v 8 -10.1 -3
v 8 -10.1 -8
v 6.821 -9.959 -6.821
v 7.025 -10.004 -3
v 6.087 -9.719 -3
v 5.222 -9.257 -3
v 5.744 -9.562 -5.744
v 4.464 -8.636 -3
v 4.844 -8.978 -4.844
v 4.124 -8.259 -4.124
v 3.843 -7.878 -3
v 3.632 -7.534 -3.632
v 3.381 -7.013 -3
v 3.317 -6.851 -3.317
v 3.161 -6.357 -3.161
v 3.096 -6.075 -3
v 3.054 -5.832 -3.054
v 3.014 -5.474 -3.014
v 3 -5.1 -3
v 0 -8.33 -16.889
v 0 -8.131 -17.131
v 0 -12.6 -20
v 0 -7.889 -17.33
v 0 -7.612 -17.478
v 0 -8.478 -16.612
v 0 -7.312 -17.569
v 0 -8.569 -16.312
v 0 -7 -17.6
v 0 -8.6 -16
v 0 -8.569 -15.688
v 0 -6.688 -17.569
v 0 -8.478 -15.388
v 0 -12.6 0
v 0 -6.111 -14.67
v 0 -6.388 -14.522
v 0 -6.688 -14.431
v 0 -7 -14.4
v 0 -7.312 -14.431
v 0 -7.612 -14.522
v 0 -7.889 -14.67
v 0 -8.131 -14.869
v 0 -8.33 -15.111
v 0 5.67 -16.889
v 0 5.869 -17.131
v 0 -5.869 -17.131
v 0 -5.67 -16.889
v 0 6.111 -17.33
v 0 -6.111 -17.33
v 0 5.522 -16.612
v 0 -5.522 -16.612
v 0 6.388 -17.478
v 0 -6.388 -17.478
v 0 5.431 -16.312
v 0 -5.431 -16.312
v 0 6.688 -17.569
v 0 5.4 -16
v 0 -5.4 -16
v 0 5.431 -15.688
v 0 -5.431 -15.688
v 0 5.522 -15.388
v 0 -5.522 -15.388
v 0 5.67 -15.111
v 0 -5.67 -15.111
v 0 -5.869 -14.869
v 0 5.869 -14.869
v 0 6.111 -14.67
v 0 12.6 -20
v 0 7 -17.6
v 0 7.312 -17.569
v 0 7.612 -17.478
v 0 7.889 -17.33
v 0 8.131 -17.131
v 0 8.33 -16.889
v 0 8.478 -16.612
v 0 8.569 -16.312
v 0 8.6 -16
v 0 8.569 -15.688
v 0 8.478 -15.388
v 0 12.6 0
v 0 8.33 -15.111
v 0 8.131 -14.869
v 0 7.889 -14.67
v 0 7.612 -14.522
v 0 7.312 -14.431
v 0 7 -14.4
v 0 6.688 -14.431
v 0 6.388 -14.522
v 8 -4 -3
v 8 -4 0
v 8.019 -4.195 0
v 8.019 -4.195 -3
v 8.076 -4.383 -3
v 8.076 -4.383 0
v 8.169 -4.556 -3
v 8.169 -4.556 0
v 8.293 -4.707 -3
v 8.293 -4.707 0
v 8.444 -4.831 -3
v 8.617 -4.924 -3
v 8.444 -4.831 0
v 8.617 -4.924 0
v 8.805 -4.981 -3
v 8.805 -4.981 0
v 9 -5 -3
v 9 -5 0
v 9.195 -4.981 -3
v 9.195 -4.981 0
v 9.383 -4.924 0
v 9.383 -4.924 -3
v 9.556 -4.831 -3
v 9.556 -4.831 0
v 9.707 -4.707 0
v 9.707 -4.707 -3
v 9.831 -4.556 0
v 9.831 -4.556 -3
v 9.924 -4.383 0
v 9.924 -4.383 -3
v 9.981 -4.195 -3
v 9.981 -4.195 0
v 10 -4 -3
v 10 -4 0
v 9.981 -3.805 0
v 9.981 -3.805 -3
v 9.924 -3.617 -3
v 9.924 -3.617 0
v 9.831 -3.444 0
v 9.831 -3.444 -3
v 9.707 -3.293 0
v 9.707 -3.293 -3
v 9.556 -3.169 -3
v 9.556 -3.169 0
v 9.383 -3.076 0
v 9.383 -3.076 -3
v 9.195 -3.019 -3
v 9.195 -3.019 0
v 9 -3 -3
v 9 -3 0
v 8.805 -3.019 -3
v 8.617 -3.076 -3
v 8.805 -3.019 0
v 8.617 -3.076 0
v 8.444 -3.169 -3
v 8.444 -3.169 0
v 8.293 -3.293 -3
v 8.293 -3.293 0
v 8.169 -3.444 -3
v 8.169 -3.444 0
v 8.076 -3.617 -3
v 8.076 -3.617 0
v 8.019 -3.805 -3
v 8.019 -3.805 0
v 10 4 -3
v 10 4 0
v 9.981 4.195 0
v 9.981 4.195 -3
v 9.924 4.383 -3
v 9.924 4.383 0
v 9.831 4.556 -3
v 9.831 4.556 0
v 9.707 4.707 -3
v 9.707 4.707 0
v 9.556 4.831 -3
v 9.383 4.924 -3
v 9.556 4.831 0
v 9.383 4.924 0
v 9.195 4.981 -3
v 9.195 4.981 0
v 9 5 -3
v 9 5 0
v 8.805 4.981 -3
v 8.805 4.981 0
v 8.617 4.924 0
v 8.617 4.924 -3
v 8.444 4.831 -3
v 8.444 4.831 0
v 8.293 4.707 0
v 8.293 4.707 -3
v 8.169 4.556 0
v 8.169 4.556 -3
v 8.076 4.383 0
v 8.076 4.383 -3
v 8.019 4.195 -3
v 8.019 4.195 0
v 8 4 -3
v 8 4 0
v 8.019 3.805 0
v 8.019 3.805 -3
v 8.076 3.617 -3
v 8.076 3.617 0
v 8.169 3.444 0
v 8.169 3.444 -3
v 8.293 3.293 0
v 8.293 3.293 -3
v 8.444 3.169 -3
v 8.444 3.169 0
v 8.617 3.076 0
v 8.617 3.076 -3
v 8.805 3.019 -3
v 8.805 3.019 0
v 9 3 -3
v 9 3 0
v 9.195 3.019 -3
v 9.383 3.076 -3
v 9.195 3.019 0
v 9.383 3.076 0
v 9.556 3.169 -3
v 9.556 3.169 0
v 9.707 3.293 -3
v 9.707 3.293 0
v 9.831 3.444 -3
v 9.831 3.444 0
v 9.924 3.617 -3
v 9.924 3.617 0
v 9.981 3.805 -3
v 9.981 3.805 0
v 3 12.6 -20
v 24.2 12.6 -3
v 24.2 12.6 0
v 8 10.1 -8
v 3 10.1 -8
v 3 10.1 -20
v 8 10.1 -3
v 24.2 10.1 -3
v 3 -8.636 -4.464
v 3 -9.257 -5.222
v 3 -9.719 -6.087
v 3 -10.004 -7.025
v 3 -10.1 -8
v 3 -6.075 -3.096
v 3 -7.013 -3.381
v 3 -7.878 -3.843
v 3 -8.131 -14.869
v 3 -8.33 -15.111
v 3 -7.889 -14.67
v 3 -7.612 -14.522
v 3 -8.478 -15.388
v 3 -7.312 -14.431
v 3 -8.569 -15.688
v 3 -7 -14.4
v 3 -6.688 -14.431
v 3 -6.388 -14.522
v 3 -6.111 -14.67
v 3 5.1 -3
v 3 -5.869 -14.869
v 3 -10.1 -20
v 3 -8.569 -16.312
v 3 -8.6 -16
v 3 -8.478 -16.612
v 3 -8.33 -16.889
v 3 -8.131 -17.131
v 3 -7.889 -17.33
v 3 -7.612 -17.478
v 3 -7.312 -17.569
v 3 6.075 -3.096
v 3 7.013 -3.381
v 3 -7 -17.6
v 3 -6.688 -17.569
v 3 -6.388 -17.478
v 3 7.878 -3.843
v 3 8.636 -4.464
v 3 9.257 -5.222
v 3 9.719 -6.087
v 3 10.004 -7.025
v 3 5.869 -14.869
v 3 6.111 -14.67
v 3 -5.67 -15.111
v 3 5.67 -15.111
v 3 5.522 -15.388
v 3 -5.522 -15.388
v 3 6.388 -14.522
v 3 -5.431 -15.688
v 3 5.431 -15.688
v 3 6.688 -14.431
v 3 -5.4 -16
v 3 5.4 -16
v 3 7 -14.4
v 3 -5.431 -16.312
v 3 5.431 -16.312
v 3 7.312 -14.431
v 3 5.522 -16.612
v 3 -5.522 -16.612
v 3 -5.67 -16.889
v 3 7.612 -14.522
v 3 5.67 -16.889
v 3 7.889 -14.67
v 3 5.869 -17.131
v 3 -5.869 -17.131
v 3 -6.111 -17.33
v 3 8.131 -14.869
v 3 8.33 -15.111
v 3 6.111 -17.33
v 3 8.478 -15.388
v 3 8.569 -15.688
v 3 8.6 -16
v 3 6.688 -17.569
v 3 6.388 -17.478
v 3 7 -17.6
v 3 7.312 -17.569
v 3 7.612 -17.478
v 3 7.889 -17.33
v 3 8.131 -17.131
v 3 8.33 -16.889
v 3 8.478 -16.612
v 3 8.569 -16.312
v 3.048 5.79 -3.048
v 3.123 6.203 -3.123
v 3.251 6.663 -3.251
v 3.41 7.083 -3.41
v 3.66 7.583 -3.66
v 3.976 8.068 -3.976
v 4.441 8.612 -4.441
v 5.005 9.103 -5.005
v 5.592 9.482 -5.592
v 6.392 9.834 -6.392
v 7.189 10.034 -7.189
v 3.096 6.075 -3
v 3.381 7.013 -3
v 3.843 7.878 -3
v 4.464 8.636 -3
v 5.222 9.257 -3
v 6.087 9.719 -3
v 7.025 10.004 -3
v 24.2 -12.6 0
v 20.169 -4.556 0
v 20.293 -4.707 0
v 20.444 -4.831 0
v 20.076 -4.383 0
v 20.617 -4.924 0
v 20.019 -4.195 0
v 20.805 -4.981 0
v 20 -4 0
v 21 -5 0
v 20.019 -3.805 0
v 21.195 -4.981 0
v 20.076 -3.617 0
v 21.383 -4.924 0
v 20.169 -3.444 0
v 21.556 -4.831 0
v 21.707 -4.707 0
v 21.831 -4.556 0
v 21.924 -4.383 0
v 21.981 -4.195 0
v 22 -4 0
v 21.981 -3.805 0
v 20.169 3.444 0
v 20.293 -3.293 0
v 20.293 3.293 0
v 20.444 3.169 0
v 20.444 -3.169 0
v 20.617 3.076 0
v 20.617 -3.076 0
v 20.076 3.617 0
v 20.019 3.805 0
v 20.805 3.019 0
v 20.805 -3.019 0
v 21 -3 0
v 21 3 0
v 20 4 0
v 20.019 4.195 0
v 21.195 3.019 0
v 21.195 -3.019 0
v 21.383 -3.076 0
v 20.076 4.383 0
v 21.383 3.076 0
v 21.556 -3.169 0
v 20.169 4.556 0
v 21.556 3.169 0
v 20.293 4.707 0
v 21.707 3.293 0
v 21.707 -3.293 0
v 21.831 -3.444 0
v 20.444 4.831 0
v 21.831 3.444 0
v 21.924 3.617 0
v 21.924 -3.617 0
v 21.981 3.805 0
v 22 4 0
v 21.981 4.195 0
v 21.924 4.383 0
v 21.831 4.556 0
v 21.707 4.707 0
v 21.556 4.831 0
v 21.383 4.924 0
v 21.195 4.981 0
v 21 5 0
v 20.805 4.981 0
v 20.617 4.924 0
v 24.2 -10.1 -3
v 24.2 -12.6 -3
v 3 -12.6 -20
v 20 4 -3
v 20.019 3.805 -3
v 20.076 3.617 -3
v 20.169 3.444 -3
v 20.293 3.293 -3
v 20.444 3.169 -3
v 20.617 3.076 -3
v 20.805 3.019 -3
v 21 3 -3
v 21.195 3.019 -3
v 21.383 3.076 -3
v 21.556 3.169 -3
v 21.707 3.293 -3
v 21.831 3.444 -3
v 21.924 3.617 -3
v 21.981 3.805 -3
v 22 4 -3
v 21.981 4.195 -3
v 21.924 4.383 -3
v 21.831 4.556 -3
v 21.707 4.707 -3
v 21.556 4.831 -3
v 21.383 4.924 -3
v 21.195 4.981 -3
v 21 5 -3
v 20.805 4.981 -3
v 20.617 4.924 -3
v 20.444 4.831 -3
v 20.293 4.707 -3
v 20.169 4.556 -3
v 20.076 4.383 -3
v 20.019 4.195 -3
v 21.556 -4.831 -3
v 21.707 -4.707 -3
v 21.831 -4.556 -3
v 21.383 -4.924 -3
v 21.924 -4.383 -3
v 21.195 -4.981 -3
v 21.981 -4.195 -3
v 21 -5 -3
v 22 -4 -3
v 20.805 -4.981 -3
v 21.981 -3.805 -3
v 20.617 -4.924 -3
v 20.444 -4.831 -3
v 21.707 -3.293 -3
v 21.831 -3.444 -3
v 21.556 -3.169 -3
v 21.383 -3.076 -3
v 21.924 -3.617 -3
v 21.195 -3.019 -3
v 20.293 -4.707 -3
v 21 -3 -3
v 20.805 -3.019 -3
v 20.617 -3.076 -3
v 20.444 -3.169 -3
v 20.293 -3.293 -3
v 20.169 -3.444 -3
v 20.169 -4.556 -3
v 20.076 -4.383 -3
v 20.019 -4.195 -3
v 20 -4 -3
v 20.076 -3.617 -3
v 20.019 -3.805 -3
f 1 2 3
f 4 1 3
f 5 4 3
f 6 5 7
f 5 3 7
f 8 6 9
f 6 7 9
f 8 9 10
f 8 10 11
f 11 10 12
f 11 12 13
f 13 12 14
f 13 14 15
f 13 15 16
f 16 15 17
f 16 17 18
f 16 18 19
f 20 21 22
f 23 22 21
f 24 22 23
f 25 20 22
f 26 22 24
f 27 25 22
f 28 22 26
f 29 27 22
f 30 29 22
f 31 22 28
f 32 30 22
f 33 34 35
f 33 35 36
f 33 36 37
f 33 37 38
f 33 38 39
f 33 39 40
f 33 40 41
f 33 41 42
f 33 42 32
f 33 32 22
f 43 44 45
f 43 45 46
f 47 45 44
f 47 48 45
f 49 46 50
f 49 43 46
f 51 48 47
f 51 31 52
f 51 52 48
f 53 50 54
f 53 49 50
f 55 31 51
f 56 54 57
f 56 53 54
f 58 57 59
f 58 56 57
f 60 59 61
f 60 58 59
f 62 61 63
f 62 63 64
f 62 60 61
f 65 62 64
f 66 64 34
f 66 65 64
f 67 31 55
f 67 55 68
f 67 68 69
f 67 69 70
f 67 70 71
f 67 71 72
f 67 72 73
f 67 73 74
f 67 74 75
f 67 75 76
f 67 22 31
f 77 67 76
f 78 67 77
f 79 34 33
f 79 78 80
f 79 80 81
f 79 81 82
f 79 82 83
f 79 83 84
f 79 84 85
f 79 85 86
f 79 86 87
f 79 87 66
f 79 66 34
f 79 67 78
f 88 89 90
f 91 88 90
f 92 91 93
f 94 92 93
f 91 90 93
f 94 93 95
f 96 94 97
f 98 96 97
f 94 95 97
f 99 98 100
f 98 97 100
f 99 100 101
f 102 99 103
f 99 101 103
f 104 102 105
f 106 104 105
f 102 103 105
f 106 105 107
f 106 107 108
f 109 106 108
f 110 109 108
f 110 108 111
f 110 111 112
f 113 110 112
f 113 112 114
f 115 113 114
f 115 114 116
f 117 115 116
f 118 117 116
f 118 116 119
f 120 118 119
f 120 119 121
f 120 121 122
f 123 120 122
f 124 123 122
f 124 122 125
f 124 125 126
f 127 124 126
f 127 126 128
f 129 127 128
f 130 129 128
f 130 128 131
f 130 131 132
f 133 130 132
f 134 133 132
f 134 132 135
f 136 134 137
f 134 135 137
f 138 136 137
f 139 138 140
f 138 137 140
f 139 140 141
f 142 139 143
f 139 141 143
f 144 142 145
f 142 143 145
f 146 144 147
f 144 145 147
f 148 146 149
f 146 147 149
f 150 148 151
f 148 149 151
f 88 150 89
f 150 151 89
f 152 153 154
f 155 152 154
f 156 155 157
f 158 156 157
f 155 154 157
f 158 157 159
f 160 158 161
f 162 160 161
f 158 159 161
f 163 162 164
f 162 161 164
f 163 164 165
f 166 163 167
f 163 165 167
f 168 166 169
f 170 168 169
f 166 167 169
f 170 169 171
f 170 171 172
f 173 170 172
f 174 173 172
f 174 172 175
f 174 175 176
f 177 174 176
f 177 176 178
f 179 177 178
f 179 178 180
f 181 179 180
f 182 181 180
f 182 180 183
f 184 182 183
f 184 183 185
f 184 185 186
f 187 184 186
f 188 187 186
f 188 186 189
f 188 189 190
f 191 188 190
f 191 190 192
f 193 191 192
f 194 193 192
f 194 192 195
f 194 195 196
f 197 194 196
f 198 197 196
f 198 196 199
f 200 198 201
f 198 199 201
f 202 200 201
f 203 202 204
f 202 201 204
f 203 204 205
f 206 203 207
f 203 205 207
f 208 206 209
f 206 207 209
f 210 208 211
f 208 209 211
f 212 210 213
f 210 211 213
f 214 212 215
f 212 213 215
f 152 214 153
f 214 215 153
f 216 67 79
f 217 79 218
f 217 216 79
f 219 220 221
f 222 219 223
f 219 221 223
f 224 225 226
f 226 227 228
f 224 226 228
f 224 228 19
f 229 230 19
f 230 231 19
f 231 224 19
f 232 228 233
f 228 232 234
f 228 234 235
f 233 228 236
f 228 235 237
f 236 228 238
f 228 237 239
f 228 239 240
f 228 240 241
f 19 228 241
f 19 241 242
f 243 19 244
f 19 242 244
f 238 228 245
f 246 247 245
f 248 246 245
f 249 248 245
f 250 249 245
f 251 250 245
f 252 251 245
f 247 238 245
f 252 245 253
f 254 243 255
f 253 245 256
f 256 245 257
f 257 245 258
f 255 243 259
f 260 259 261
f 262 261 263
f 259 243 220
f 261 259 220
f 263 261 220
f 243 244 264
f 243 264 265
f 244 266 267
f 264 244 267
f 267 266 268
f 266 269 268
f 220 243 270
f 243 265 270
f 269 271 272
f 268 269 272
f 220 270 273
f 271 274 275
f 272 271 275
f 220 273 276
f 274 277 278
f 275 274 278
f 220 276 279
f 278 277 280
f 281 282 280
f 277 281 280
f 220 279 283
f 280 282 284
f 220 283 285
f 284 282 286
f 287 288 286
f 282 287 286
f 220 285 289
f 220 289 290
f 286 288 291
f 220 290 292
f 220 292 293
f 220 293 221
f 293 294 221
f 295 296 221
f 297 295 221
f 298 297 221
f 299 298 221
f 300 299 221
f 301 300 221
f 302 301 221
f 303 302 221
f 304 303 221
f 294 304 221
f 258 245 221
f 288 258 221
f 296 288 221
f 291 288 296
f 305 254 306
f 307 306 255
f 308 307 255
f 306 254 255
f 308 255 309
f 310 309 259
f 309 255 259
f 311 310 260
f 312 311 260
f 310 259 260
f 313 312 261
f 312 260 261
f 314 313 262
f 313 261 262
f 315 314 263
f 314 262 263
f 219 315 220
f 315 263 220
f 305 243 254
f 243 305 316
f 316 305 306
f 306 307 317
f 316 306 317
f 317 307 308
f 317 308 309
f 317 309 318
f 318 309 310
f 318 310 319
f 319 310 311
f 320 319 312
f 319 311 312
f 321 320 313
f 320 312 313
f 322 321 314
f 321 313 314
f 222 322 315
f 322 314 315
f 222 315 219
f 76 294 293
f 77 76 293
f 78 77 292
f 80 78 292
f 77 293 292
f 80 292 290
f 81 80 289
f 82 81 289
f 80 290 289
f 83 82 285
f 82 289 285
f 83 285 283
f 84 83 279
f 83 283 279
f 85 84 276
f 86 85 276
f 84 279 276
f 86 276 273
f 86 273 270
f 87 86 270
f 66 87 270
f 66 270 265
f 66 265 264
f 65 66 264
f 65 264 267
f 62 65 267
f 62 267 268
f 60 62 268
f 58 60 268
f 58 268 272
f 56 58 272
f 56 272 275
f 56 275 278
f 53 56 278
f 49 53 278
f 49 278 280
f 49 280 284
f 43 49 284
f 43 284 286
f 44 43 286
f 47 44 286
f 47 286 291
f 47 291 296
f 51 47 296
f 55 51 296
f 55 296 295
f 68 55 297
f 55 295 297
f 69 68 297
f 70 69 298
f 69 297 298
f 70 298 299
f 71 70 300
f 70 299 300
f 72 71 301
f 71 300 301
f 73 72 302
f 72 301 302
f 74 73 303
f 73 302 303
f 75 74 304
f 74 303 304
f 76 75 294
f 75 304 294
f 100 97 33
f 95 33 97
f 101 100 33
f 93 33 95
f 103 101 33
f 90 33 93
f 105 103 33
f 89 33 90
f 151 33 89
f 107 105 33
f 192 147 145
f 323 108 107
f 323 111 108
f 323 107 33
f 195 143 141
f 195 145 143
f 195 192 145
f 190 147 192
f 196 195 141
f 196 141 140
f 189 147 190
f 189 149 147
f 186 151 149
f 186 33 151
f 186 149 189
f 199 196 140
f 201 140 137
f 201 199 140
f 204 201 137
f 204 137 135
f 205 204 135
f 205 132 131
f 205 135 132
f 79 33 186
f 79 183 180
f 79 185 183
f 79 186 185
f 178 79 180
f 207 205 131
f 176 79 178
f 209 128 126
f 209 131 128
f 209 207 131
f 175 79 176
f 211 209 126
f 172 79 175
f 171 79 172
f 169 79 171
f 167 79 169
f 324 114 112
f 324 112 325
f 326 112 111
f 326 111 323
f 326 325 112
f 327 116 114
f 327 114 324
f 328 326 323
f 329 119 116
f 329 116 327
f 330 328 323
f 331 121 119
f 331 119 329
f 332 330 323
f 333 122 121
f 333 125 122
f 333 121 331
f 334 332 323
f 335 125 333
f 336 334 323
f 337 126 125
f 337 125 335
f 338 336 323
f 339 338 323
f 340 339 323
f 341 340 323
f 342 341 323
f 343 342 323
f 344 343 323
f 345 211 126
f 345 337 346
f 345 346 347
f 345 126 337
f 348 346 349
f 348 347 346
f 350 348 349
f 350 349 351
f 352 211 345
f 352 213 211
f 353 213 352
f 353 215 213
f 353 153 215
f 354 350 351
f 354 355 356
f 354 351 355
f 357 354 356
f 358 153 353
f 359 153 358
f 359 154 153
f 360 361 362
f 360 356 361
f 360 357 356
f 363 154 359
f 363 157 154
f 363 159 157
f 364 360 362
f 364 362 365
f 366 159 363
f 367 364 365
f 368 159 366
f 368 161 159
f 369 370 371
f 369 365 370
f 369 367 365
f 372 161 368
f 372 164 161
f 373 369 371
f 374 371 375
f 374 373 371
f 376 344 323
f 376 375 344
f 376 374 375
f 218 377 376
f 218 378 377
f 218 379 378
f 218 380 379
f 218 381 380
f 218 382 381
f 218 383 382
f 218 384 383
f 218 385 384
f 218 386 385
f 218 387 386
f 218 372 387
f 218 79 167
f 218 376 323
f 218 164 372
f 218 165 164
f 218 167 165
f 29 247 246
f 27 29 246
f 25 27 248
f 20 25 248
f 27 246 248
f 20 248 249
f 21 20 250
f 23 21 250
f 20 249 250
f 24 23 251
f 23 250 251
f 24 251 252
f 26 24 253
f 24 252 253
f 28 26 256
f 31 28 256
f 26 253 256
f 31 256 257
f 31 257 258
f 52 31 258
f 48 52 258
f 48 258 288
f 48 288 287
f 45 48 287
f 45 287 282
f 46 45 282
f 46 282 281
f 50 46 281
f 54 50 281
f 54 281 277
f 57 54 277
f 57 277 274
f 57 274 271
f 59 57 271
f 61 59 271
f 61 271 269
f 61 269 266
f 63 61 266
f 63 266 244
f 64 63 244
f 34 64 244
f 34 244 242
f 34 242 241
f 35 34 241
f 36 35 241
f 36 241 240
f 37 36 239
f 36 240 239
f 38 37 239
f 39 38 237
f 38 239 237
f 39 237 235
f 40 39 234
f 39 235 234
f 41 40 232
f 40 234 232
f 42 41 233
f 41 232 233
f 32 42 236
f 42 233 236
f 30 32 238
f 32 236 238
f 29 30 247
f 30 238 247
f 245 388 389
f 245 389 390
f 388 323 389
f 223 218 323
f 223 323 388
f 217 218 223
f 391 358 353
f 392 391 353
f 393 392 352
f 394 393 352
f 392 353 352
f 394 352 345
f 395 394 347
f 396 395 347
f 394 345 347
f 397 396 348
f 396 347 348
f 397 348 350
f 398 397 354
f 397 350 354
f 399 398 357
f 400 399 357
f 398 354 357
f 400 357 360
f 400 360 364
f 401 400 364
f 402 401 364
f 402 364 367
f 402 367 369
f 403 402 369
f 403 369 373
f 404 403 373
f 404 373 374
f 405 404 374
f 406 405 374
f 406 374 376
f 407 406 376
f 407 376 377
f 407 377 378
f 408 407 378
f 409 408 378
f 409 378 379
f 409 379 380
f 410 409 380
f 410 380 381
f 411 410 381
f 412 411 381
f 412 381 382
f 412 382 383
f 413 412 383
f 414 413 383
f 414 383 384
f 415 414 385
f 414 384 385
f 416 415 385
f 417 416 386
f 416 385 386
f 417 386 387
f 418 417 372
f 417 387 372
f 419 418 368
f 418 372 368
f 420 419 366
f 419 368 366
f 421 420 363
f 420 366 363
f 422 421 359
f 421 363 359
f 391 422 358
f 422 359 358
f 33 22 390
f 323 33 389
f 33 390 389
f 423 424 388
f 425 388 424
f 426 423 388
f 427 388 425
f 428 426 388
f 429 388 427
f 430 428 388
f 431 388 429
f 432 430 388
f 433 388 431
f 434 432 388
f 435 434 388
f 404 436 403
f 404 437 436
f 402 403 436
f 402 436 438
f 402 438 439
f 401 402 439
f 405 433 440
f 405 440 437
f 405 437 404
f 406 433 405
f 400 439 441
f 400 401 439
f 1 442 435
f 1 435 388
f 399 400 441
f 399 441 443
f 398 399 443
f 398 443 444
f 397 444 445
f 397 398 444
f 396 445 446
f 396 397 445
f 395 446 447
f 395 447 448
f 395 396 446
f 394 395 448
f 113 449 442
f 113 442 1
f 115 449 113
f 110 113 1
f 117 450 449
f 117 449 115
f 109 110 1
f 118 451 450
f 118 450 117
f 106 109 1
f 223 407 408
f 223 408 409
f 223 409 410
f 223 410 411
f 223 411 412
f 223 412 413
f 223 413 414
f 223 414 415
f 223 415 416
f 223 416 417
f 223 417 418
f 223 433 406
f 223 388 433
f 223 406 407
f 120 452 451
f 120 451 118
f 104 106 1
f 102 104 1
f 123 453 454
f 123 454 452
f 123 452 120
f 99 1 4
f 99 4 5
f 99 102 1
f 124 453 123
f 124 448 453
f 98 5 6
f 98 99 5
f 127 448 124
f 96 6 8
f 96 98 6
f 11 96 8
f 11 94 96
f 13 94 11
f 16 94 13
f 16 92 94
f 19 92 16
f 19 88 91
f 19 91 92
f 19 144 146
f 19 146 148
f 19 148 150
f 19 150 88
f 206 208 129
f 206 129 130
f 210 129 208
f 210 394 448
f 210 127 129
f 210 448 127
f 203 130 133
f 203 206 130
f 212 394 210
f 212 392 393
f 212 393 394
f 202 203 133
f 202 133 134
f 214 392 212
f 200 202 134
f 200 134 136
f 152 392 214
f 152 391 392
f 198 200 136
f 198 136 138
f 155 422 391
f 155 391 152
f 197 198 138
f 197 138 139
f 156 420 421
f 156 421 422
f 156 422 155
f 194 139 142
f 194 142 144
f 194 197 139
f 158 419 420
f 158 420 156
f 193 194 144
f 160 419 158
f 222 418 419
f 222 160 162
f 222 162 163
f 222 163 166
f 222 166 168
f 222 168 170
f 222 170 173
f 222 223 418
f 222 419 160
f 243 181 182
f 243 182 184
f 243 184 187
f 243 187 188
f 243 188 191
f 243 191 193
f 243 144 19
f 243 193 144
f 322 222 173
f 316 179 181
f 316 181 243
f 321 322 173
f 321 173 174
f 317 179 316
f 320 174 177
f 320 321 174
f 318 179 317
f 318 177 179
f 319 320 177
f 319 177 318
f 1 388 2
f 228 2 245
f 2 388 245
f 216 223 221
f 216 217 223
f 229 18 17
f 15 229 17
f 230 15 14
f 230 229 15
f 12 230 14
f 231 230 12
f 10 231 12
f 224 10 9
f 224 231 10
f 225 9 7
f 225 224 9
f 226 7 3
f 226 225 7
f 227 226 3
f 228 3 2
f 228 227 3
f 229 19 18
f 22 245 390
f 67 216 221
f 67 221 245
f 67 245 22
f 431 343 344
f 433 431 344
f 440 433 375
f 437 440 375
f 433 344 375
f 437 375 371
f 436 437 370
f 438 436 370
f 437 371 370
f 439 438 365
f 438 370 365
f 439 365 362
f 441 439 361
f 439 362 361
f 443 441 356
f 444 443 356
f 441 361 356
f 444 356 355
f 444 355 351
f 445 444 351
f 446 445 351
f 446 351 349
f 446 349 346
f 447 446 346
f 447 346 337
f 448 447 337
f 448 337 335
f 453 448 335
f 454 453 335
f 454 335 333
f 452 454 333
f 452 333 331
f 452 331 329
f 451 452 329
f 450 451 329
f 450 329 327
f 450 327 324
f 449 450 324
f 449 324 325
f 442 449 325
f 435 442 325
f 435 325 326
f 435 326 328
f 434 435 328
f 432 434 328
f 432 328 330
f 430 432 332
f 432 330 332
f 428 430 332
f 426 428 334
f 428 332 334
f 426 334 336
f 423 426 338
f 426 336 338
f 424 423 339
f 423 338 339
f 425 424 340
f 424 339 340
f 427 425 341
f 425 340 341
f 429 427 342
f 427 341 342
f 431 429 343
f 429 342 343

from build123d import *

# Parameters (mm, degrees)
EXTRUDE_1_DEPTH     = 12.6
SKETCH_2_W          = 21.2
SKETCH_2_H          = 20.2
CUT_EXTRUDE_1_DEPTH = 17
SKETCH_3_R          = 1
CUT_EXTRUDE_2_DEPTH = 34.828981658
SKETCH_4_R          = 1.6
CUT_EXTRUDE_3_DEPTH = 32.75216528
FILLET_1_R          = 5
CUT_EXTRUDE_4_DEPTH = 17


with BuildPart() as part:
    # 草图1 → 凸台-拉伸1 (new, symmetric)
    with BuildSketch(Plane(origin=(0, 0, 0), x_dir=(1, 0, 0), z_dir=(0, 1, 0))):
        Polygon((0, 0), (24.2, 0), (24.2, 3), (3, 20), (0, 20), align=None)
    extrude(amount=EXTRUDE_1_DEPTH, both=True)

    # 草图2 → 切除-拉伸1 (cut)
    with BuildSketch(Plane(origin=(0, 0, -20), x_dir=(-1, 0, 0), z_dir=(0, 0, -1))):
        with Locations((-13.6, 0)):
            Rectangle(SKETCH_2_W, SKETCH_2_H)
    extrude(amount=-CUT_EXTRUDE_1_DEPTH, mode=Mode.SUBTRACT)

    # 草图3 → 切除-拉伸2 (cut, through all)
    with BuildSketch(Plane.XY):
        with Locations((21, -4)):
            Circle(SKETCH_3_R)
        with Locations(Location((21, 4, 0), (0, 0, 180))):
            Circle(SKETCH_3_R)
        with Locations((9, 4)):
            Circle(SKETCH_3_R)
        with Locations(Location((9, -4, 0), (0, 0, 180))):
            Circle(SKETCH_3_R)
    extrude(amount=-CUT_EXTRUDE_2_DEPTH, mode=Mode.SUBTRACT)

    # 草图4 → 切除-拉伸3 (cut, through all)
    with BuildSketch(Plane(origin=(3, 0, 0), x_dir=(0, 0, -1), z_dir=(1, 0, 0))):
        with Locations(Location((16, 7, 0), (0, 0, 90))):
            Circle(SKETCH_4_R)
        with Locations(Location((16, -7, 0), (0, 0, 270))):
            Circle(SKETCH_4_R)
    extrude(amount=-CUT_EXTRUDE_3_DEPTH, mode=Mode.SUBTRACT)

    # 圆角1
    fillet_1_edges = [part.edges().sort_by_distance(p)[0] for p in [
        (13.6, -10.1, -3),
        (13.6, 10.1, -3),
    ]]
    fillet(fillet_1_edges, radius=FILLET_1_R)

    # 草图6 → 切除-拉伸4 (cut)
    with BuildSketch(Plane(origin=(0, 0, -20), x_dir=(-1, 0, 0), z_dir=(0, 0, -1))):
        with BuildLine():
            Line((-3, -5.1), (-3, 5.1))
            ThreePointArc((-3, 5.1), (-4.464466094, 8.635533906), (-8, 10.1))
            Line((-8, 10.1), (-24.2, 10.1))
            Line((-24.2, 10.1), (-24.2, -10.1))
            Line((-24.2, -10.1), (-8, -10.1))
            ThreePointArc((-8, -10.1), (-4.464466094, -8.635533906), (-3, -5.1))
        make_face()
    extrude(amount=-CUT_EXTRUDE_4_DEPTH, mode=Mode.SUBTRACT)


solid = part.part
